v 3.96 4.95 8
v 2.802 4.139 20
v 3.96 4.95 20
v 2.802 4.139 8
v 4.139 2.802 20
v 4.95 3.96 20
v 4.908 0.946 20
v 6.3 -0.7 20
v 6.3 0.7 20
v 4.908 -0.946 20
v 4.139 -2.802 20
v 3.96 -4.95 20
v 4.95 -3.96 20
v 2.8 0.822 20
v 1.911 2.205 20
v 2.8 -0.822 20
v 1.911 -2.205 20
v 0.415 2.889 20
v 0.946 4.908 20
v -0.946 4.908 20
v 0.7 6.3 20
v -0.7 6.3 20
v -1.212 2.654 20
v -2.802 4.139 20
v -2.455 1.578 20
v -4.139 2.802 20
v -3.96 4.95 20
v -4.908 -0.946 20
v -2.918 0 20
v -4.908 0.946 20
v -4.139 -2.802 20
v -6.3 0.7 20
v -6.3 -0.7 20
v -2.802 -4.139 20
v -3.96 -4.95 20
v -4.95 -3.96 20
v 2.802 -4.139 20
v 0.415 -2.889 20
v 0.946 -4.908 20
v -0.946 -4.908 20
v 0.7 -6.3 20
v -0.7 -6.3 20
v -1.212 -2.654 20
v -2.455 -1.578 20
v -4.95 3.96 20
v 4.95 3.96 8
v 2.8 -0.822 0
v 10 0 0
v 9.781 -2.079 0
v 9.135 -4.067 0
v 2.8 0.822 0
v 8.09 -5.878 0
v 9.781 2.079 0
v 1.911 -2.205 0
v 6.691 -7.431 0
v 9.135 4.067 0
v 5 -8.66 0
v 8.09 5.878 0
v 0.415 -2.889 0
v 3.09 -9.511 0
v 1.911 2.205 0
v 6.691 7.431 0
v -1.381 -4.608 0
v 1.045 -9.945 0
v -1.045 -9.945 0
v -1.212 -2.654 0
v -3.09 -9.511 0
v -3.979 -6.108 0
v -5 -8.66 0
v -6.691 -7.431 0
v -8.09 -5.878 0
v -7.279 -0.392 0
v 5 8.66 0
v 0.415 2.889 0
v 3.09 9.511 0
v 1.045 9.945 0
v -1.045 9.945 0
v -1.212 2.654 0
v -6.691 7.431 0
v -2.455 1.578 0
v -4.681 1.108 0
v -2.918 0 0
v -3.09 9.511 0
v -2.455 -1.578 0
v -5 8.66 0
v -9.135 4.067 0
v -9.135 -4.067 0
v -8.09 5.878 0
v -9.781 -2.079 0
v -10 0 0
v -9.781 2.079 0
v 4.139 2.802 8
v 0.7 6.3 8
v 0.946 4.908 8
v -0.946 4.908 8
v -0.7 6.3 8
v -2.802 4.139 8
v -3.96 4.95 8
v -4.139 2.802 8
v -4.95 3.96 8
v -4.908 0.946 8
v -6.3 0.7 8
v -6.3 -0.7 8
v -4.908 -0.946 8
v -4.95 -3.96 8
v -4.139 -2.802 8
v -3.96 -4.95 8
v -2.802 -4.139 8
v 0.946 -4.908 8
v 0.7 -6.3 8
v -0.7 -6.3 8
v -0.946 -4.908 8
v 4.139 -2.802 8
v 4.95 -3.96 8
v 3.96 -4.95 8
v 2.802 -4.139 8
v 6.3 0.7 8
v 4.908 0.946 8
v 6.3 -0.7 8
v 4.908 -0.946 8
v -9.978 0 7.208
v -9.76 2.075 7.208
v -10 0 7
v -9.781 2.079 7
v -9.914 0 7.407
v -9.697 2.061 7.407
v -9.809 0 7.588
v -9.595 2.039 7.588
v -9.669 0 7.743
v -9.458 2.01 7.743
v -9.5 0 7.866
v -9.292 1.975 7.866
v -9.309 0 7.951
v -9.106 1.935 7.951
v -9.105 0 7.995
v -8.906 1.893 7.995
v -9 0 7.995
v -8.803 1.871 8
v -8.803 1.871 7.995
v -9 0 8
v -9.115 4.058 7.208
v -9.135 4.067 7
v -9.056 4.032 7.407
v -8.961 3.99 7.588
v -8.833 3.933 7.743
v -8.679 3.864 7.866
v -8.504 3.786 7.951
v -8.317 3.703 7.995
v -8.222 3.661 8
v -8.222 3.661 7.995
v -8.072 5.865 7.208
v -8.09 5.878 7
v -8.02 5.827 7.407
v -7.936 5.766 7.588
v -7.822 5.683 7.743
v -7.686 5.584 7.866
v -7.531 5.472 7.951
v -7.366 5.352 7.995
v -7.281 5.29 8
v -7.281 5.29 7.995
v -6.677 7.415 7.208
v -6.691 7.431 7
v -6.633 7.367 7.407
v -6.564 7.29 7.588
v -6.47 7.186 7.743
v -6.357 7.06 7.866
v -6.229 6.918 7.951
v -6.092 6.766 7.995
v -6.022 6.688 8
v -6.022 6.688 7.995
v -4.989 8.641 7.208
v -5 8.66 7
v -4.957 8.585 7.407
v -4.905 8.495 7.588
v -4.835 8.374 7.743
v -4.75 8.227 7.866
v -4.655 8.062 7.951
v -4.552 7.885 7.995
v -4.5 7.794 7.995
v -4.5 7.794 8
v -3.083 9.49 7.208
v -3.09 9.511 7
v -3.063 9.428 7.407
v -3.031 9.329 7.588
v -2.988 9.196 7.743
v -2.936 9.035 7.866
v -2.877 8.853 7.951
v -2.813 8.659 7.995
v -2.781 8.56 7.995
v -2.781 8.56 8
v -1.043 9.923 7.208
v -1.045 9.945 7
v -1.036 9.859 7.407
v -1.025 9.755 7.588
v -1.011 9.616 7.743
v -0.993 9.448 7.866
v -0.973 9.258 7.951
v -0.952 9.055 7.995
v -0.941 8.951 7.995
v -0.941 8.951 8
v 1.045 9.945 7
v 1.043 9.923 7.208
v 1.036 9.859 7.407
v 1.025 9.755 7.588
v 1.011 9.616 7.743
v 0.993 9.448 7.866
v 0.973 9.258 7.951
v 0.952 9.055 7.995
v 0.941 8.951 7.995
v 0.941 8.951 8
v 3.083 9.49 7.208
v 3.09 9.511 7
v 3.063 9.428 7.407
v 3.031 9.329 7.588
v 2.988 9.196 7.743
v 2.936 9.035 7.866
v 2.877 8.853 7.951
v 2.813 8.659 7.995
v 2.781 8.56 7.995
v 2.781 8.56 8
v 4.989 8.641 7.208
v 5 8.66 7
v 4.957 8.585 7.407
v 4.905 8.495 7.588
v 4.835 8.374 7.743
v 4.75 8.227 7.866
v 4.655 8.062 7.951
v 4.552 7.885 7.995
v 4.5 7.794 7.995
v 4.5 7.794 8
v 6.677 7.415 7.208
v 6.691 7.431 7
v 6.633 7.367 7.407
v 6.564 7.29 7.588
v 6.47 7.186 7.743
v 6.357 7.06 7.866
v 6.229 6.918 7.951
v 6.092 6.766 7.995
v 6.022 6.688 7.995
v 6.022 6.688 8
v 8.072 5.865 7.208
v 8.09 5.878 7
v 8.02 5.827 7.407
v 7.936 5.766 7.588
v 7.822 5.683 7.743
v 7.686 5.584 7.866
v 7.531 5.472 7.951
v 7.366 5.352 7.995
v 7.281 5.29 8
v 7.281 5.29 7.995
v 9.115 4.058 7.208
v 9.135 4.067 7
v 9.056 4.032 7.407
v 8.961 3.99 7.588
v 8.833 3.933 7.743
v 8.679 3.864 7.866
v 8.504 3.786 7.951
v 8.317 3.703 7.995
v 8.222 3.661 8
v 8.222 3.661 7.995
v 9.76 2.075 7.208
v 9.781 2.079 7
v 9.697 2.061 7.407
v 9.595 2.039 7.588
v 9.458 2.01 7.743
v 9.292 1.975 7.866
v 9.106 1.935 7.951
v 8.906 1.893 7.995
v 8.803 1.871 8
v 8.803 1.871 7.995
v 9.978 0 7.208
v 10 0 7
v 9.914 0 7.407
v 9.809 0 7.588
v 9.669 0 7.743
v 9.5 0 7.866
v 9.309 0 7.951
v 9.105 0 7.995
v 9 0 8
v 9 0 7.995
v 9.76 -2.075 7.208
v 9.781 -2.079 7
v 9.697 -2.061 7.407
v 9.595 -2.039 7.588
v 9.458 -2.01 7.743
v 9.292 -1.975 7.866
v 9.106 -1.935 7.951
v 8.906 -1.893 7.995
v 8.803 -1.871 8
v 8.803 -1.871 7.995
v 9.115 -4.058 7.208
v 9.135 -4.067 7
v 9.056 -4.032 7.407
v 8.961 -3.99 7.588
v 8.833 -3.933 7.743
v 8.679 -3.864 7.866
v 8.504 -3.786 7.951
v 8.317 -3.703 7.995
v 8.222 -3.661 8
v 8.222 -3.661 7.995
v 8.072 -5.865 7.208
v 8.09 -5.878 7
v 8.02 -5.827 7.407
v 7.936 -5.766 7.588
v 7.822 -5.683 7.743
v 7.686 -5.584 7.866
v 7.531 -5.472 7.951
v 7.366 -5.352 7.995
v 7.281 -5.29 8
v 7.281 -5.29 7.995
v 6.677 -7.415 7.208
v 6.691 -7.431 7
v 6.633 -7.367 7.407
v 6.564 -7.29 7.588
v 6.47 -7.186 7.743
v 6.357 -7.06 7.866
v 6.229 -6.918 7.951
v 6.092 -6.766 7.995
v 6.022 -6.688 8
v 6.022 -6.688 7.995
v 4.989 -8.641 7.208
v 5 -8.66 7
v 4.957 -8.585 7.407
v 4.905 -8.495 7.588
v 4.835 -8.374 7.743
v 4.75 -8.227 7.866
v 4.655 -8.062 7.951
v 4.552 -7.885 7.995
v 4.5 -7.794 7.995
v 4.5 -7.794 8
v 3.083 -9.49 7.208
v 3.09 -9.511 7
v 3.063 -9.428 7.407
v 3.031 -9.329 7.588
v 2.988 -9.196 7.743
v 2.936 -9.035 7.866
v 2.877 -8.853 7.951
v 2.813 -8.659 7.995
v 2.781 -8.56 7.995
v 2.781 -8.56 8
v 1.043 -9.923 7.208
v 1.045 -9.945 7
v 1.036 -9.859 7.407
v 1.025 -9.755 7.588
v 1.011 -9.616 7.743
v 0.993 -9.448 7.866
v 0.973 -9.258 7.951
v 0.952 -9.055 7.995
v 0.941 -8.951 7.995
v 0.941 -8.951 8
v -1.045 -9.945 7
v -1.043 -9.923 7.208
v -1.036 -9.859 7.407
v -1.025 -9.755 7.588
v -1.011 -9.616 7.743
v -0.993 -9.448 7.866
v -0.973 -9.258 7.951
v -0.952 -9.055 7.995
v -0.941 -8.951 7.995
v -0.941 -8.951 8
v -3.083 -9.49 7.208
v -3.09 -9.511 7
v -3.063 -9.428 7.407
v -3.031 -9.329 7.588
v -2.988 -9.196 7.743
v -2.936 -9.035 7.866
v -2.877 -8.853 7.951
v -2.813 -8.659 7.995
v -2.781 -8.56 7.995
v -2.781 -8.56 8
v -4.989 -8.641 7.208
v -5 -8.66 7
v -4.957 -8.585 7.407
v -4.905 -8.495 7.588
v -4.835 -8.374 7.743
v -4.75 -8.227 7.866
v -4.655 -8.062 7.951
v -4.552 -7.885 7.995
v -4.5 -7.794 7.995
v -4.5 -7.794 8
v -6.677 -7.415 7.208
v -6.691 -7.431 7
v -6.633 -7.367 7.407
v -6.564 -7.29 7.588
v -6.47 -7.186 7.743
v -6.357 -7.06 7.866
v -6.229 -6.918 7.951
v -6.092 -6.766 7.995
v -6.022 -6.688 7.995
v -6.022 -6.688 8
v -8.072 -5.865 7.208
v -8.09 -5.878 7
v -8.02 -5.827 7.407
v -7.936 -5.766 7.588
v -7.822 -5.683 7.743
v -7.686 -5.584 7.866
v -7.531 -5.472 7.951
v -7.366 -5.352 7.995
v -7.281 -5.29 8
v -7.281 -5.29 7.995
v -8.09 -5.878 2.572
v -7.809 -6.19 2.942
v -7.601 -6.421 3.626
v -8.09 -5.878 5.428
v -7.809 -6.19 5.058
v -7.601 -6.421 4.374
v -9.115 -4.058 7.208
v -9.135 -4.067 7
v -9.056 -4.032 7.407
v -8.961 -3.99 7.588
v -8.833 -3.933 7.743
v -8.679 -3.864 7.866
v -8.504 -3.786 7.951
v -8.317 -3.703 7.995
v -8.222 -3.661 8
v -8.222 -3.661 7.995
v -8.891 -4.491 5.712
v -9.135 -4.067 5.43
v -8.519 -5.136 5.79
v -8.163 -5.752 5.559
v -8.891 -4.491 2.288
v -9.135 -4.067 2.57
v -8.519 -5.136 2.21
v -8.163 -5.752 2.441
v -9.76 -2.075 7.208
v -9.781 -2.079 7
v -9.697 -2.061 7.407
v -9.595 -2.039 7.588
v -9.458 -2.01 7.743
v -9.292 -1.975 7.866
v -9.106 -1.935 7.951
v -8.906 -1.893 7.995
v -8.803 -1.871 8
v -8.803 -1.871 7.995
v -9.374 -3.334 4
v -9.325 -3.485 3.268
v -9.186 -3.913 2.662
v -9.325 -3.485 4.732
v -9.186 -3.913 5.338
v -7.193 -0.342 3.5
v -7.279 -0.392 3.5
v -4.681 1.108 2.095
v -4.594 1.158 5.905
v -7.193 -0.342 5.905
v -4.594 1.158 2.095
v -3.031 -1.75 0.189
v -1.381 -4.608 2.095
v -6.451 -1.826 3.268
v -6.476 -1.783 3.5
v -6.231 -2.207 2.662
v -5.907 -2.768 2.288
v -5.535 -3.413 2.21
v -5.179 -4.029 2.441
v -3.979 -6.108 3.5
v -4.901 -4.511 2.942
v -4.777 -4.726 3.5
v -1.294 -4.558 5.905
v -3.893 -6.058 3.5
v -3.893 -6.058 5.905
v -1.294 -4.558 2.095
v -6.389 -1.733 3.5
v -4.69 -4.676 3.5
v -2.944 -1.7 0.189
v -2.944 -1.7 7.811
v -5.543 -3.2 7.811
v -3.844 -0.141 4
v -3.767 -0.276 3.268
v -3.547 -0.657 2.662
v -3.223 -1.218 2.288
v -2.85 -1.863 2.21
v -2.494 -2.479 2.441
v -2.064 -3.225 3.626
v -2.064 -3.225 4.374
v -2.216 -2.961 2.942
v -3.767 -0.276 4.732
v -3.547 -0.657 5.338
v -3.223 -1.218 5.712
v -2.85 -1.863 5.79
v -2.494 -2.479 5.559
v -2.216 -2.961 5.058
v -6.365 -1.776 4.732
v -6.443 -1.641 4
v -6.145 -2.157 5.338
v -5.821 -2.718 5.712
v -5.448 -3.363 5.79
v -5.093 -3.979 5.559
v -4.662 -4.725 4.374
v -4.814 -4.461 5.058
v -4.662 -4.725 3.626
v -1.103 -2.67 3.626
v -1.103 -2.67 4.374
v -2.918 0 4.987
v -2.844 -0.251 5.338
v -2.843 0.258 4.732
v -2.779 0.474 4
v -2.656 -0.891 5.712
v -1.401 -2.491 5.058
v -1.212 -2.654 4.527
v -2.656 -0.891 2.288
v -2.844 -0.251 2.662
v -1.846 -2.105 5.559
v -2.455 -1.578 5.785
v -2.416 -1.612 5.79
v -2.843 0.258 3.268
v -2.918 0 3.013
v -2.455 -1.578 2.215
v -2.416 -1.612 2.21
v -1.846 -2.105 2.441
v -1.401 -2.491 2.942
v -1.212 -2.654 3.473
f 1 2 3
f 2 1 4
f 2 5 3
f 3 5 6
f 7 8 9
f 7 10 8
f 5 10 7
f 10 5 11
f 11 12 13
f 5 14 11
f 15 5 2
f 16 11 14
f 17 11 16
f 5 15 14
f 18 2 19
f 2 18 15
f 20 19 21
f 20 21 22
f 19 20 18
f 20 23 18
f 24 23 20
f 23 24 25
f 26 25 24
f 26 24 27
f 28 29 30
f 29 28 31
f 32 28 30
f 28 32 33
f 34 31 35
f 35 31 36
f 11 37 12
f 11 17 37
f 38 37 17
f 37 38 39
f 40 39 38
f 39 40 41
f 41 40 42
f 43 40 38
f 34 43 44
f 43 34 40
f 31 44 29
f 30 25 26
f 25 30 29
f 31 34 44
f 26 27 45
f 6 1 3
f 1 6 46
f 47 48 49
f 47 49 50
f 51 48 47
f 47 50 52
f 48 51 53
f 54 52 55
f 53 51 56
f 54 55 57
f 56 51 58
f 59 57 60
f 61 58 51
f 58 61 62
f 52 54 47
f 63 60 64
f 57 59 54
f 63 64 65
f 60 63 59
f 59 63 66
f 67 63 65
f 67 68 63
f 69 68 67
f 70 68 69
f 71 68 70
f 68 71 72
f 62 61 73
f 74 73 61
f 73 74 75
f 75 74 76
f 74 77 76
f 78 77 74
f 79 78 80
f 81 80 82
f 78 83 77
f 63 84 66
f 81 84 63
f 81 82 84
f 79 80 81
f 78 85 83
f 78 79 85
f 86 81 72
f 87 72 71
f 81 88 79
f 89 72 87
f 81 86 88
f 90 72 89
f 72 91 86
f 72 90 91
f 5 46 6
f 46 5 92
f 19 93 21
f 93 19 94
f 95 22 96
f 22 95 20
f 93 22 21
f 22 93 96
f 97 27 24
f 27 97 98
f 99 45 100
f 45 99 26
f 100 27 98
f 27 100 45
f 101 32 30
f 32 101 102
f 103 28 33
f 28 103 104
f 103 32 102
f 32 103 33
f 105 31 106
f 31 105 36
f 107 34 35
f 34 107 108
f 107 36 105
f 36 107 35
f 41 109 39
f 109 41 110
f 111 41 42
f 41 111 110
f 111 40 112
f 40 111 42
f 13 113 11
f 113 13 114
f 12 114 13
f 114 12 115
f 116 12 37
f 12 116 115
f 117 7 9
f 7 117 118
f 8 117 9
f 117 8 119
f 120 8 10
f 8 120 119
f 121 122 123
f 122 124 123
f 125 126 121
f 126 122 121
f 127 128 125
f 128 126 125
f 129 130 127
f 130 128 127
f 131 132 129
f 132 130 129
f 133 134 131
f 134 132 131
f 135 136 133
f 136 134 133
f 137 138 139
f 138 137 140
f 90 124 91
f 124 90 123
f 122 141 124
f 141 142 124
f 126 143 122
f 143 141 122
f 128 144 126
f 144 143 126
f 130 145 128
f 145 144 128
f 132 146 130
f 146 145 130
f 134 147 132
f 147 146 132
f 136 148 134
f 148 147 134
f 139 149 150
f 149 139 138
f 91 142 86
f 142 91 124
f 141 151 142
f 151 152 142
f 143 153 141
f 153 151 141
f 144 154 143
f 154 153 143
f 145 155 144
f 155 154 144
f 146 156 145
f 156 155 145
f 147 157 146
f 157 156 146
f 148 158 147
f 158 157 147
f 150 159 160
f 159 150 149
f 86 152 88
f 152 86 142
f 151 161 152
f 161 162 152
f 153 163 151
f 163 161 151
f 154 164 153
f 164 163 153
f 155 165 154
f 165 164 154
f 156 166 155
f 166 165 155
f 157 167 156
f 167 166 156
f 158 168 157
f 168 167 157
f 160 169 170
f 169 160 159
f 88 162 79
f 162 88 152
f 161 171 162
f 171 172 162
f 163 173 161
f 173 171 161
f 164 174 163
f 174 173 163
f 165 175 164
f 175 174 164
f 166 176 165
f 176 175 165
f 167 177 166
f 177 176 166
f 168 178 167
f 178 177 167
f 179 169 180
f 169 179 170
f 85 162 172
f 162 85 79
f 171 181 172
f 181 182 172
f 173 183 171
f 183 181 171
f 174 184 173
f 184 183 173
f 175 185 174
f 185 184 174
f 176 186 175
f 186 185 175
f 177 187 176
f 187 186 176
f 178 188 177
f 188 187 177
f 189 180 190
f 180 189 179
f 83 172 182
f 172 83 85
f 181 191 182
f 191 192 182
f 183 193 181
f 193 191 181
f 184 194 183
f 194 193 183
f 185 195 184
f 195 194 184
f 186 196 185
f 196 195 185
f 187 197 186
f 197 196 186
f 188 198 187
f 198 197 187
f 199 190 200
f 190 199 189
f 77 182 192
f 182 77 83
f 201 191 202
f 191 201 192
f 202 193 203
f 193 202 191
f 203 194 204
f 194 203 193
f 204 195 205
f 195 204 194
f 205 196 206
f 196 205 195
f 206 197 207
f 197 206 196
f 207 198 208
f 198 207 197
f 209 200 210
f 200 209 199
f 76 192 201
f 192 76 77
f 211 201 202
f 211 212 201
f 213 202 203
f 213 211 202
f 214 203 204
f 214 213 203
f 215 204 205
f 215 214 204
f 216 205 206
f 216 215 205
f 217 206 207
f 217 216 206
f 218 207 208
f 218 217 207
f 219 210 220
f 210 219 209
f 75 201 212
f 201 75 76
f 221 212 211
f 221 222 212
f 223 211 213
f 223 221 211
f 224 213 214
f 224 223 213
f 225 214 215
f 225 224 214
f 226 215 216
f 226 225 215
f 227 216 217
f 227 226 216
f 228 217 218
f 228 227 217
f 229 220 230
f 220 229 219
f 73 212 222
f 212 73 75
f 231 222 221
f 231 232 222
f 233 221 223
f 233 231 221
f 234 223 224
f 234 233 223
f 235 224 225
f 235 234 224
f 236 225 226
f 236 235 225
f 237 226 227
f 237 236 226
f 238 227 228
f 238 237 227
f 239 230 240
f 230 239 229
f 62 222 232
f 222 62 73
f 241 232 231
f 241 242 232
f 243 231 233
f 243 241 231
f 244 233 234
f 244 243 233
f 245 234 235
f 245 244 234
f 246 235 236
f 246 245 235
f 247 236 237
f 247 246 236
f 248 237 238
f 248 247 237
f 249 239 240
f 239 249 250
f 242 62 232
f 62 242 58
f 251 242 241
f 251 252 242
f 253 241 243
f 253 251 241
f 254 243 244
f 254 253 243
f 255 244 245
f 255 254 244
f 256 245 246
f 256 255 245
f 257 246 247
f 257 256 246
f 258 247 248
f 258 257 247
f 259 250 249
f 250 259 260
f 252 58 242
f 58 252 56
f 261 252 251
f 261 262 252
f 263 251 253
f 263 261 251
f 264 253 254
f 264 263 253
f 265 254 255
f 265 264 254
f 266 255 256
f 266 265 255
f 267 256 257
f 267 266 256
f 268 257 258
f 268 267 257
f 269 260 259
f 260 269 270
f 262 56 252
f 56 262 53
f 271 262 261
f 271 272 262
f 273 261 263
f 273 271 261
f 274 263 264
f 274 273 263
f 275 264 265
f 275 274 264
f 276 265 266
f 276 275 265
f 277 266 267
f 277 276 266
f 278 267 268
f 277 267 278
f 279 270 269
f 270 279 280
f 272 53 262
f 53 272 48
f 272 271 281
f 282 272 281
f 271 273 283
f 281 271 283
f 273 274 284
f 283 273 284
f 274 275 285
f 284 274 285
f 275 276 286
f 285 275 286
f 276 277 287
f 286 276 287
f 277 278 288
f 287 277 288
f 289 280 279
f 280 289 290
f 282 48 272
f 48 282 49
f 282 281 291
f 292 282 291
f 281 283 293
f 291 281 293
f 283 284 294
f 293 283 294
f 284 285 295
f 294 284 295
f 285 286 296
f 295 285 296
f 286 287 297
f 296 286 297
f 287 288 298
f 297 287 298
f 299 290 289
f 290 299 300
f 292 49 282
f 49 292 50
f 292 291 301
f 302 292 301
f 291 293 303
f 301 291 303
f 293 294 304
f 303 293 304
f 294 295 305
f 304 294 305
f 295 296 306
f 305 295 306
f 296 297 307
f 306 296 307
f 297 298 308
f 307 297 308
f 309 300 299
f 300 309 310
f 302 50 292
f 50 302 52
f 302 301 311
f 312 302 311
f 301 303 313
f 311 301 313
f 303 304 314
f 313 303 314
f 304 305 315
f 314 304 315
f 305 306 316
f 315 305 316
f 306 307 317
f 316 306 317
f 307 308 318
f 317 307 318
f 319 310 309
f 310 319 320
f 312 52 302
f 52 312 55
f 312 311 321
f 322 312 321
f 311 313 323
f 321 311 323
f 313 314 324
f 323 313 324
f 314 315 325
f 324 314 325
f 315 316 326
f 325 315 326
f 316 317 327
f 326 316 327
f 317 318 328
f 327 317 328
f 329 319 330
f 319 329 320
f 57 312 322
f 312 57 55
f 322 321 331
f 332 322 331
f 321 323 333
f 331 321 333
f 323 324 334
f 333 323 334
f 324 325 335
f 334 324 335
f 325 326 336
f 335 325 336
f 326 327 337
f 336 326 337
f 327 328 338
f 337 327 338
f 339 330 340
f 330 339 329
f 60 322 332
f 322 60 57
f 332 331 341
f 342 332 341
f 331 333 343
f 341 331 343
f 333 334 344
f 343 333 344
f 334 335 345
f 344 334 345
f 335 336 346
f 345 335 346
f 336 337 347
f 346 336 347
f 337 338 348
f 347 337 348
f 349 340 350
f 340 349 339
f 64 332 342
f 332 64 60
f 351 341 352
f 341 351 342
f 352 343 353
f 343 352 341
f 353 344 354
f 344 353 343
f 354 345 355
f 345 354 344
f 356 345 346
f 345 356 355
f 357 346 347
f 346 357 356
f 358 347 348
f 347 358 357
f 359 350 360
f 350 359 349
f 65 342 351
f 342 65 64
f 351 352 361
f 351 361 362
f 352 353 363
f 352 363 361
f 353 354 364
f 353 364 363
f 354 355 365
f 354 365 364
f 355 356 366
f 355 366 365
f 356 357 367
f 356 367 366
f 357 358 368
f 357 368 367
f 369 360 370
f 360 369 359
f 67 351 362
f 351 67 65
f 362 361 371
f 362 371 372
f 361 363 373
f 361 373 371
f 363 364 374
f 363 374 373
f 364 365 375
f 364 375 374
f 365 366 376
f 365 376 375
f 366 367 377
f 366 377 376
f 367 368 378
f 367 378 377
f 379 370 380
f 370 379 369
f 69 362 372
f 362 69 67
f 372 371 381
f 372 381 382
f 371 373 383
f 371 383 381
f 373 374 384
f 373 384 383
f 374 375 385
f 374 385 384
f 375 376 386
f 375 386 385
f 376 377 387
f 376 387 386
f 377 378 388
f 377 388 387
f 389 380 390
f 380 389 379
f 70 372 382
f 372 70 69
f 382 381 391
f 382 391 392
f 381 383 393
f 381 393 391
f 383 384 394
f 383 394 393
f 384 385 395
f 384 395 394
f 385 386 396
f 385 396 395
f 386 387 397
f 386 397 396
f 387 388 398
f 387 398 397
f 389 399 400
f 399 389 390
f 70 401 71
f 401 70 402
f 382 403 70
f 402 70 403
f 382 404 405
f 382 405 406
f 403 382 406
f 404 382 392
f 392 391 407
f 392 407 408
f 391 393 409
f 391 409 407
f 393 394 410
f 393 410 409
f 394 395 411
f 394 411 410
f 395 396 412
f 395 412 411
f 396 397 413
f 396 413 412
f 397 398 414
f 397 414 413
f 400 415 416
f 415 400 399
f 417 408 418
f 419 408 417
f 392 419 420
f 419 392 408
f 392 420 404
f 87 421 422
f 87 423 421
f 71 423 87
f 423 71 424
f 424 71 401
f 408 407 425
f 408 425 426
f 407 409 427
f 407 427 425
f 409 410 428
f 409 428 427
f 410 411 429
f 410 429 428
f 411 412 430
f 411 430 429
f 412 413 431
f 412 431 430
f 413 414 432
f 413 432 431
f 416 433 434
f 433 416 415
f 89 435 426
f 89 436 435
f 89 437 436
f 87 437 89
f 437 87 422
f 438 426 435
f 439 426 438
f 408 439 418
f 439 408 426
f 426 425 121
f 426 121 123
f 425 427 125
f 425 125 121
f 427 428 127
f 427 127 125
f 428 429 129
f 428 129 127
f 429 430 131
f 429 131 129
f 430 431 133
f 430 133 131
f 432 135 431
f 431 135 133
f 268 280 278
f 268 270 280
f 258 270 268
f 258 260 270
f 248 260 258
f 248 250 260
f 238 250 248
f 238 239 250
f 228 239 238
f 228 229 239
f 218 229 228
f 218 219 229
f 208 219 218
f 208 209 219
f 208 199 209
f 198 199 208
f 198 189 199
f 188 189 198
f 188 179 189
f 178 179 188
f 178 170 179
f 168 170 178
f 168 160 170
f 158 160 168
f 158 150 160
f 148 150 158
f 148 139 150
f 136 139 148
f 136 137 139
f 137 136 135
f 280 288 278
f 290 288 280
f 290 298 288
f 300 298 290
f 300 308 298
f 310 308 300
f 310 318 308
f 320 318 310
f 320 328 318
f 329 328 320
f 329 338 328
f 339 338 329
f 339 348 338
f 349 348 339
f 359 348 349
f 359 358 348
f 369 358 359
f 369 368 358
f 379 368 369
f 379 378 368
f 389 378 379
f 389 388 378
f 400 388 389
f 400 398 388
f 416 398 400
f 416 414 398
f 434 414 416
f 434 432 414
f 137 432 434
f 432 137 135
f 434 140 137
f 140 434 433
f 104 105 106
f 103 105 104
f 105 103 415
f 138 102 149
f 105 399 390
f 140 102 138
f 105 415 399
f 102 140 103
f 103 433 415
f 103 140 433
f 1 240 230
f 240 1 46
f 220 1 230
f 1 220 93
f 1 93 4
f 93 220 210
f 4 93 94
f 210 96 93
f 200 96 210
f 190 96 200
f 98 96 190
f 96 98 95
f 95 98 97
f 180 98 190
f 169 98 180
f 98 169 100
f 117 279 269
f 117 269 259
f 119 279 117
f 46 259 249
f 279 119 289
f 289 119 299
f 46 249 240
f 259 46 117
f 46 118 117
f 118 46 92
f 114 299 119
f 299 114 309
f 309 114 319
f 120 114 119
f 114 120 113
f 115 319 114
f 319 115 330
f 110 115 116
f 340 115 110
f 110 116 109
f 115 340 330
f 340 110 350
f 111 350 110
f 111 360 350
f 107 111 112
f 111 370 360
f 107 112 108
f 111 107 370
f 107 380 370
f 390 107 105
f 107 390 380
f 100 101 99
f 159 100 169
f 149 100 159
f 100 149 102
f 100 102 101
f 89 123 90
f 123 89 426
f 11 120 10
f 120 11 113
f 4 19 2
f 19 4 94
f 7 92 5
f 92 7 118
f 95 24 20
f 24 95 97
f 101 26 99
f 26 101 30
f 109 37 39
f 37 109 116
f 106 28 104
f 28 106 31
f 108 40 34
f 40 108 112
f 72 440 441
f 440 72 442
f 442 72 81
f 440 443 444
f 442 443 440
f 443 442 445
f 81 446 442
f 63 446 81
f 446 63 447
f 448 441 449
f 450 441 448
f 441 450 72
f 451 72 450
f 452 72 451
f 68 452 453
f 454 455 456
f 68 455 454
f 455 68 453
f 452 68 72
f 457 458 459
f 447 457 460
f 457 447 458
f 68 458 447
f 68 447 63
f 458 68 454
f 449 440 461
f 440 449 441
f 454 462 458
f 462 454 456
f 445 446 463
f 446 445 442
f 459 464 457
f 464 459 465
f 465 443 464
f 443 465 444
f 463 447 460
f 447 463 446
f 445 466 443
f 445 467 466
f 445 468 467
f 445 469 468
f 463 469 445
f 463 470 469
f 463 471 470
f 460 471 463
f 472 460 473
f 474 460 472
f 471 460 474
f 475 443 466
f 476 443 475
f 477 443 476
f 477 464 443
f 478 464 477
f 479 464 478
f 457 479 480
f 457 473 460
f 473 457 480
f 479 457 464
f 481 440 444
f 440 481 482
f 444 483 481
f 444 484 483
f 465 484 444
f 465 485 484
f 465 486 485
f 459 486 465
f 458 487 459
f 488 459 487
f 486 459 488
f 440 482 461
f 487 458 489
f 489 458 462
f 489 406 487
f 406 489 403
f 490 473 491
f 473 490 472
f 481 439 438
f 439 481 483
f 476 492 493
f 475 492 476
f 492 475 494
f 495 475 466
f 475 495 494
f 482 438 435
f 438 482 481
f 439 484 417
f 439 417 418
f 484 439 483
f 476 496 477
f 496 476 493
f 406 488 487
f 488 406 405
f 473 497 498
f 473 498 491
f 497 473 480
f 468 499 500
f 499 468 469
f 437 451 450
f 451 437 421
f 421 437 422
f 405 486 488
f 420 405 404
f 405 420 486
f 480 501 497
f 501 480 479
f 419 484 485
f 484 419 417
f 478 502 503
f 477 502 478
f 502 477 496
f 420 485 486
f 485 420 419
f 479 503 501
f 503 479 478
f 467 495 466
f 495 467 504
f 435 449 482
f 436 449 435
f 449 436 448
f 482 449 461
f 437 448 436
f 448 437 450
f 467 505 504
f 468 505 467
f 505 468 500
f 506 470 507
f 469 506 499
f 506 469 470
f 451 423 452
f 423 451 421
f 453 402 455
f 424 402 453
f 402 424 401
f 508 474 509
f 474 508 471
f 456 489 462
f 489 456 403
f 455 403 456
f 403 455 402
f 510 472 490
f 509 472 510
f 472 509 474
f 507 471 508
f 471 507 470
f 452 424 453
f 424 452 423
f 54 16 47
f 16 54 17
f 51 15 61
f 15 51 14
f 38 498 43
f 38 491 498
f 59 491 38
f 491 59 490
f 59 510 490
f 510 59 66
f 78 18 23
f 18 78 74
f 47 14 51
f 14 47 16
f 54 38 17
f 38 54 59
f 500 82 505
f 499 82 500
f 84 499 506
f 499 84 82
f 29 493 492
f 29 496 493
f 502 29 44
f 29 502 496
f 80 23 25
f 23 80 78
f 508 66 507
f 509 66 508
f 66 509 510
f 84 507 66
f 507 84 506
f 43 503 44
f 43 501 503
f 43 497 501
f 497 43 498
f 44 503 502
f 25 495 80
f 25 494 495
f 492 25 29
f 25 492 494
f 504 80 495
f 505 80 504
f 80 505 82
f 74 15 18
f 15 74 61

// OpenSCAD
// file: functions.scad
// PRUSA Mendel  
// Functions used in many files
// GNU GPL v2
// Josef Průša
// josefprusa@me.com
// prusadjs.cz
// http://www.reprap.org/wiki/Prusa_Mendel
// http://github.com/prusajr/PrusaMendel

module nut( d, h, horizontal = true )
{
	cornerdiameter = ( d / 2 ) / cos( 180 / 6 );
	cylinder( h = h, r = cornerdiameter, $fn = 6 );
	if( horizontal )
	{
		for( i = [1 : 6] )
		{
			rotate( [0, 0, 60 * i] ) translate( [-cornerdiameter - 0.2, 0, 0] ) rotate( [0, 0, -45] ) cube( size = [2, 2, h] );
		}
	}
}

// By nophead
module polyhole( d, h ) 
{
	n = max( round( 2 * d ), 3 );
	rotate( [0, 0, 180] ) cylinder( h = h, r = ( d / 2 ) / cos( 180 / n ), $fn = n );
}

module roundcorner( diameter )
{
	difference()
	{
		cube( size = [diameter, diameter, 99], center = false );
		translate( v = [diameter, diameter, 0] ) cylinder( h = 100, r = diameter, center = true );
	}
}
// file: metric.scad
// PRUSA Mendel  
// Default metric sizes
// GNU GPL v2
// Josef Průša
// josefprusa@me.com
// prusadjs.cz
// http://www.reprap.org/wiki/Prusa_Mendel
// http://github.com/prusajr/PrusaMendel

// DONT CHANGE THIS FILE! ALTER VALUES IN CONFIGURATION.SCAD INSTEAD

// RODS

threaded_rod_diameter = 8.2;
threaded_rod_diameter_horizontal = 8.2;
smooth_bar_diameter = 8;
smooth_bar_diameter_horizontal = 8.5;

// Nuts and bolts

m8_diameter = 9;
m8_nut_diameter = 16.4;

m4_diameter = 4.5;
m4_nut_diameter = 9;

m3_diameter = 3.6;
m3_nut_diameter = 6.1;

// Bushing holder

bushing_core_diameter = smooth_bar_diameter;
bushing_material_thickness = 1;

// Motors

motor_shaft = 5.5;
// file: configuration.scad
// PRUSA Mendel  
// Configuration file
// GNU GPL v2
// Josef Průša
// josefprusa@me.com
// prusadjs.cz
// http://www.reprap.org/wiki/Prusa_Mendel
// http://github.com/prusajr/PrusaMendel

// PLEASE SELECT ONE OF THE CONFIGURATIONS BELOW
// BY UN-COMMENTING IT

// Uncomment for metric settings
// METRIC METRIC METRIC METRIC METRIC METRIC METRIC METRIC 

include <metric.scad>;

// Uncomment for imperial settings
// IMPERIAL IMPERIAL IMPERIAL IMPERIAL IMPERIAL IMPERIAL IMPERIAL 

//include <sae.scad>;

// CUSTOM CUSTOM CUSTOM CUSTOM CUSTOM CUSTOM CUSTOM CUSTOM CUSTOM

// Thin walls
layer_height = 0.3;
wot = 1.5;
filament_width = layer_height * wot;

thin_wall = 4 * layer_height * wot;

// LM8UU
linear = true;
linear_bearing_diameter = 15;
linear_bearing_length = 24;

//608 bearing
bearing_diameter = 22;
bearing_thickness = 7;

//Timing belt
belt_pitch = 5;

// CHANGE ONLY THE STUFF YOU KNOW
// IT WILL REPLACE DEFAULT SETTING

// RODS

// threaded_rod_diameter = 0;
// threaded_rod_diameter_horizontal = 0;
// smooth_bar_díameter = 0;
// smooth_bar_díameter_horizontal = 0;

// Nuts and bolts

// m8_diameter = 0;
// m8_nut_diameter = 0;
// m8_nut_thickness = 0;

// m4_diameter = 0;
 m4_nut_diameter = 8.5;
// m4_nut_thickness = 0;

// m3_diameter = 0;
// m3_nut_diameter = 0;
m3_nut_thickness = 3;

// Bushing holder

// bushing_core_diameter = smooth_bar_díameter;
// bushing_material_thickness = 0;

///counted stuff
m3_nut_diameter_bigger = ( ( m3_nut_diameter  / 2) / cos( 180 / 6 ) ) * 2;

// functions 
include <functions.scad>
// main file
// Belt pulley is http://www.thingiverse.com/thing:3104 by GilesBathgate
// GPLV3

include <configuration.scad>

/**
 * @id pulley
 * @name Pulley
 * @category Printed
 * @using 1 m3nut
 * @using 1 m3x10xhex
 */

pulley();

module pulley()
{
	module spur()
	{
		linear_extrude( height = 20 ) polygon( [[-1, -1], [-1, 1], [0.7, 0.7], [0.7, -0.7]], [[0, 1, 2, 3, 0]] );
	}
	
	difference()
	{	 
 		union()
	 	{
	 		//base
	 		rotate_extrude( $fn = 30 )
	 		{
				square( [9, 8] );
				square( [10, 7] );
				translate( [9, 7] ) circle( 1 );
			}
			
			//shaft
			cylinder( r = motor_shaft - 0.2, h = 20, $fn = 8 );
    	
			//spurs
			for( i = [1 : 8] ) rotate( [0, 0, i * ( 360 / 8 )] )
			translate( [5.6, 0, 0] ) spur();
		}
   
		//shaft hole
		translate( [0, 0,- 1] ) polyhole( motor_shaft + 0.1, 22 );
    		
 		//captive nut and grub holes
		for( j = [1 : 1] ) rotate( [0, 0, j * ( 360 / 3 )] )
		translate( [0, 20, 4] ) rotate( [90, 0, 0] )
		union()
		{
			//entrance
			translate( [0, -3, 15] ) cube( [m3_nut_diameter + 0.5, 5, 3], center = true );
			//nut
			translate( [0, 0, 13.6] ) rotate( [0, 0, 30] ) nut( m3_nut_diameter + 0.5, 3, false );
			//grub hole
			translate( [0, 0, 9] ) cylinder( r = m3_diameter / 2, h = 10, $fn = 15 );
		}
	}
}
